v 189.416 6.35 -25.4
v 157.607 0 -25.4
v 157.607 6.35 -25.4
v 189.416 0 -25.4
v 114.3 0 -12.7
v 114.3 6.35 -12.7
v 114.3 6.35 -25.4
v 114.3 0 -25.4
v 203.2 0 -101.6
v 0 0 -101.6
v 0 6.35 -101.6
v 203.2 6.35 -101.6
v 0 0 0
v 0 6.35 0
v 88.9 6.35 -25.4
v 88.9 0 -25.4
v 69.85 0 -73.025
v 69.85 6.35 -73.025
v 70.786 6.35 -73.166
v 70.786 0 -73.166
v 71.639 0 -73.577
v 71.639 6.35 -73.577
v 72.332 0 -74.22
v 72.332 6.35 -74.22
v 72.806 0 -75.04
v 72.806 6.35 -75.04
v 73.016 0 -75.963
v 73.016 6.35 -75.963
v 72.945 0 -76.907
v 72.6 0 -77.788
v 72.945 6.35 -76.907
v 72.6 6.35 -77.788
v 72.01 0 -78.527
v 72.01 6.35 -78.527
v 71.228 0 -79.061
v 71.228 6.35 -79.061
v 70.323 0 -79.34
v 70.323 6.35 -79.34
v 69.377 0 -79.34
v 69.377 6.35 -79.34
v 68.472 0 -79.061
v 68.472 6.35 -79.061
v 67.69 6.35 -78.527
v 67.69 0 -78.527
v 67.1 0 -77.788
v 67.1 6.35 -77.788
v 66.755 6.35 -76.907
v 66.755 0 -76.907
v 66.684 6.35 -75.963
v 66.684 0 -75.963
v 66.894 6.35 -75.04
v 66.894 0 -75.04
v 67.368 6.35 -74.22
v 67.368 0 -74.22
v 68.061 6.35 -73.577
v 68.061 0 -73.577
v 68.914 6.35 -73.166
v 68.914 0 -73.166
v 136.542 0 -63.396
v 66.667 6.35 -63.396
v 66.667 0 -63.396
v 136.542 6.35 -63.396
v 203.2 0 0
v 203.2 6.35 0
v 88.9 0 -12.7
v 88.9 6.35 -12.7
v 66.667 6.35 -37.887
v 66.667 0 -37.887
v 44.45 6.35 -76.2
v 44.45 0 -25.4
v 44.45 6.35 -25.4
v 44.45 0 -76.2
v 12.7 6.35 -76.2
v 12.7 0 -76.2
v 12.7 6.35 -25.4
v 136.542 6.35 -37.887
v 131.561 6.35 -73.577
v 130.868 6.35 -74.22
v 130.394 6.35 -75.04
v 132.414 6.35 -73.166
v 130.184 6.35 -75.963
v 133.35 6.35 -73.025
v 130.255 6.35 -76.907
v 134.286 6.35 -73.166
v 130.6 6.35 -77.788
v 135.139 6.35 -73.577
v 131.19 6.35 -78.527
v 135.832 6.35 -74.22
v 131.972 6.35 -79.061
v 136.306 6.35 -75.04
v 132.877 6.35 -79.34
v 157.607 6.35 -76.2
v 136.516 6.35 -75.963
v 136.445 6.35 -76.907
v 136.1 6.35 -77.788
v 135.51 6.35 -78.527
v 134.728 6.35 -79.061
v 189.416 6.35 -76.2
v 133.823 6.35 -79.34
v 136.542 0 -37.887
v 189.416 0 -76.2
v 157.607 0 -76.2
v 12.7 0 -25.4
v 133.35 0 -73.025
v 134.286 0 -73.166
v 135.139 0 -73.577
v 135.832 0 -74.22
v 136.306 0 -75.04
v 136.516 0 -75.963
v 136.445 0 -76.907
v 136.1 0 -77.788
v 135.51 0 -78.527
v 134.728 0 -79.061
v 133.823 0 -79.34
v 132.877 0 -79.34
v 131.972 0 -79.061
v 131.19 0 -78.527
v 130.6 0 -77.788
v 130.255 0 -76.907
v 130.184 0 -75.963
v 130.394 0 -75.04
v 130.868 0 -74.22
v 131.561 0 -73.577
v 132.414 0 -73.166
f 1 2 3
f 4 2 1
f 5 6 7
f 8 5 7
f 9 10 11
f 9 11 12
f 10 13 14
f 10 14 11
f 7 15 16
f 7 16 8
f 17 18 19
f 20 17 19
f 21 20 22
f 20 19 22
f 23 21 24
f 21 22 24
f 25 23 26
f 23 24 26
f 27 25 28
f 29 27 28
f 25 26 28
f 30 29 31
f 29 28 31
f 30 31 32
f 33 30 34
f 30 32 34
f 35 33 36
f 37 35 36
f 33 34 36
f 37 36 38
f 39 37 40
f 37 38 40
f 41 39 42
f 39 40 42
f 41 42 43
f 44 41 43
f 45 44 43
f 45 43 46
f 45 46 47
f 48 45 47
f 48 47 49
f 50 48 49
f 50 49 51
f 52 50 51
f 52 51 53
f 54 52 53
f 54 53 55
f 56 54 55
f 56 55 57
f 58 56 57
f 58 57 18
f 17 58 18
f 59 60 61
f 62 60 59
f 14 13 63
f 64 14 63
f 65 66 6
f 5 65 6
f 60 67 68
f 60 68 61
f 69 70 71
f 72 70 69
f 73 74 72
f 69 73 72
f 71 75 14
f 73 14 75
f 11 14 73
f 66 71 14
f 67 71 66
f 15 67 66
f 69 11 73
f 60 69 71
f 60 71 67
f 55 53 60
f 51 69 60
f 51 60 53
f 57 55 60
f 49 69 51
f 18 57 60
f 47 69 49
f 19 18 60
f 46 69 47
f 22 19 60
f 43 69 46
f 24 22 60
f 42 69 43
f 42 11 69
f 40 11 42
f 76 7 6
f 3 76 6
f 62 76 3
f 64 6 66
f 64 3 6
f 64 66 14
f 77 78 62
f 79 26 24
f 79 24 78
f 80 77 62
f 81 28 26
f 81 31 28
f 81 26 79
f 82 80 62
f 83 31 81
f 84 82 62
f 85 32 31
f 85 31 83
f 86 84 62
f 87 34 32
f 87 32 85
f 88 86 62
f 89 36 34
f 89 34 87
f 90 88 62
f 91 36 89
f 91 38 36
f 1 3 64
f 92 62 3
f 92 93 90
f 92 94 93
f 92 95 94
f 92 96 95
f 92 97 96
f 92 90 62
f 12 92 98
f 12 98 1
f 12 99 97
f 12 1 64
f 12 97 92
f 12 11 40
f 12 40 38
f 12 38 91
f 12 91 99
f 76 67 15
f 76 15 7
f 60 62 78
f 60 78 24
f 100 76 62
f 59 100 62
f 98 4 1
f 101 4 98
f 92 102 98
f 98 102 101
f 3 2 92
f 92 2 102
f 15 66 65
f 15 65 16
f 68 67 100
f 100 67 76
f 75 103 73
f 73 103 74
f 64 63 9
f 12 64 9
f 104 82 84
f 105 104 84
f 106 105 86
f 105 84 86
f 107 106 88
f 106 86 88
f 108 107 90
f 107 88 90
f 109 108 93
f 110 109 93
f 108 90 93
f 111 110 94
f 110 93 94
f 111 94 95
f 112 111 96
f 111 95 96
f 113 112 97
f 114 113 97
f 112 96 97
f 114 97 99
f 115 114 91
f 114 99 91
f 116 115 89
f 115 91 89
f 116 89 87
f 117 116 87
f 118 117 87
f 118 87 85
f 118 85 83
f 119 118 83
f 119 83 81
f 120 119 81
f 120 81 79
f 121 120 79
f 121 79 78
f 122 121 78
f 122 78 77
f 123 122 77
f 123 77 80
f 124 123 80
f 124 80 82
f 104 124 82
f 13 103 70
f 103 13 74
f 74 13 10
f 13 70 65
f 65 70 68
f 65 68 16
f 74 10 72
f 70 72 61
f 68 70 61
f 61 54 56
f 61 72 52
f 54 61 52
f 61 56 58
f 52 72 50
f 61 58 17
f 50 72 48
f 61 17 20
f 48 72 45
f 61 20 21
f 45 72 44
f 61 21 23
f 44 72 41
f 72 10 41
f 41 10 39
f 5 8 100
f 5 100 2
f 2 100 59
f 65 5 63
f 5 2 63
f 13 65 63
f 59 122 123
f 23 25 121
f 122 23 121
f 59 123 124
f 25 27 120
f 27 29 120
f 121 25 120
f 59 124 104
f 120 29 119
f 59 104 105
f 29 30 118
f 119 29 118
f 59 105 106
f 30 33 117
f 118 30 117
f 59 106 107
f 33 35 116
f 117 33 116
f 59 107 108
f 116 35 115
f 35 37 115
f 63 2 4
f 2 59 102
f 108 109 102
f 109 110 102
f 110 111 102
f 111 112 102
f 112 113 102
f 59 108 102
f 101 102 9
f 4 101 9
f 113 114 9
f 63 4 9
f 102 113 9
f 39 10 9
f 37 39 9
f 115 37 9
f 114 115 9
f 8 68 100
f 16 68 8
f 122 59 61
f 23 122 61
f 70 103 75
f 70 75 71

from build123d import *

# Parameters (mm, degrees)
SKETCH2_W           = 203.2
SKETCH2_H           = 101.6
SKETCH2_W_2         = 31.75
SKETCH2_H_2         = 50.8
SKETCH2_W_3         = 31.808931498
BOSS_EXTRUDE1_DEPTH = 6.35
SKETCH3_R           = 3.175
CUT_EXTRUDE1_DEPTH  = 34.544
SKETCH5_W           = 69.874867022
SKETCH5_H           = 25.509122939
CUT_EXTRUDE2_DEPTH  = 34.544
SKETCH6_W           = 25.4
SKETCH6_H           = 12.7
CUT_EXTRUDE3_DEPTH  = 34.544


with BuildPart() as part:
    # Sketch2 → Boss-Extrude1 (new body)
    with BuildSketch(Plane(origin=(0, 0, 0), x_dir=(1, 0, 0), z_dir=(0, 1, 0))):
        with Locations((101.6, 50.8)):
            Rectangle(SKETCH2_W, SKETCH2_H)
        with Locations((28.575, 50.8)):
            Rectangle(SKETCH2_W_2, SKETCH2_H_2, mode=Mode.SUBTRACT)
        with Locations((173.511909894, 50.8)):
            Rectangle(SKETCH2_W_3, SKETCH2_H_2, mode=Mode.SUBTRACT)
    extrude(amount=BOSS_EXTRUDE1_DEPTH)

    # Sketch3 → Cut-Extrude1 (cut)
    with BuildSketch(Plane(origin=(0, 6.35, 0), x_dir=(1, 0, 0), z_dir=(0, 1, 0))):
        with Locations(Location((69.85, 76.2, 0), (0, 0, 270))):
            Circle(SKETCH3_R)
        with Locations(Location((133.35, 76.2, 0), (0, 0, 270))):
            Circle(SKETCH3_R)
    extrude(amount=-CUT_EXTRUDE1_DEPTH, mode=Mode.SUBTRACT)

    # Sketch5 → Cut-Extrude2 (cut)
    with BuildSketch(Plane(origin=(0, 6.35, 0), x_dir=(1, 0, 0), z_dir=(0, 1, 0))):
        with Locations((101.604794403, 50.641324615)):
            Rectangle(SKETCH5_W, SKETCH5_H)
    extrude(amount=-CUT_EXTRUDE2_DEPTH, mode=Mode.SUBTRACT)

    # Sketch6 → Cut-Extrude3 (cut)
    with BuildSketch(Plane(origin=(0, 6.35, 0), x_dir=(1, 0, 0), z_dir=(0, 1, 0))):
        with Locations((101.6, 19.05)):
            Rectangle(SKETCH6_W, SKETCH6_H)
    extrude(amount=-CUT_EXTRUDE3_DEPTH, mode=Mode.SUBTRACT)


solid = part.part
